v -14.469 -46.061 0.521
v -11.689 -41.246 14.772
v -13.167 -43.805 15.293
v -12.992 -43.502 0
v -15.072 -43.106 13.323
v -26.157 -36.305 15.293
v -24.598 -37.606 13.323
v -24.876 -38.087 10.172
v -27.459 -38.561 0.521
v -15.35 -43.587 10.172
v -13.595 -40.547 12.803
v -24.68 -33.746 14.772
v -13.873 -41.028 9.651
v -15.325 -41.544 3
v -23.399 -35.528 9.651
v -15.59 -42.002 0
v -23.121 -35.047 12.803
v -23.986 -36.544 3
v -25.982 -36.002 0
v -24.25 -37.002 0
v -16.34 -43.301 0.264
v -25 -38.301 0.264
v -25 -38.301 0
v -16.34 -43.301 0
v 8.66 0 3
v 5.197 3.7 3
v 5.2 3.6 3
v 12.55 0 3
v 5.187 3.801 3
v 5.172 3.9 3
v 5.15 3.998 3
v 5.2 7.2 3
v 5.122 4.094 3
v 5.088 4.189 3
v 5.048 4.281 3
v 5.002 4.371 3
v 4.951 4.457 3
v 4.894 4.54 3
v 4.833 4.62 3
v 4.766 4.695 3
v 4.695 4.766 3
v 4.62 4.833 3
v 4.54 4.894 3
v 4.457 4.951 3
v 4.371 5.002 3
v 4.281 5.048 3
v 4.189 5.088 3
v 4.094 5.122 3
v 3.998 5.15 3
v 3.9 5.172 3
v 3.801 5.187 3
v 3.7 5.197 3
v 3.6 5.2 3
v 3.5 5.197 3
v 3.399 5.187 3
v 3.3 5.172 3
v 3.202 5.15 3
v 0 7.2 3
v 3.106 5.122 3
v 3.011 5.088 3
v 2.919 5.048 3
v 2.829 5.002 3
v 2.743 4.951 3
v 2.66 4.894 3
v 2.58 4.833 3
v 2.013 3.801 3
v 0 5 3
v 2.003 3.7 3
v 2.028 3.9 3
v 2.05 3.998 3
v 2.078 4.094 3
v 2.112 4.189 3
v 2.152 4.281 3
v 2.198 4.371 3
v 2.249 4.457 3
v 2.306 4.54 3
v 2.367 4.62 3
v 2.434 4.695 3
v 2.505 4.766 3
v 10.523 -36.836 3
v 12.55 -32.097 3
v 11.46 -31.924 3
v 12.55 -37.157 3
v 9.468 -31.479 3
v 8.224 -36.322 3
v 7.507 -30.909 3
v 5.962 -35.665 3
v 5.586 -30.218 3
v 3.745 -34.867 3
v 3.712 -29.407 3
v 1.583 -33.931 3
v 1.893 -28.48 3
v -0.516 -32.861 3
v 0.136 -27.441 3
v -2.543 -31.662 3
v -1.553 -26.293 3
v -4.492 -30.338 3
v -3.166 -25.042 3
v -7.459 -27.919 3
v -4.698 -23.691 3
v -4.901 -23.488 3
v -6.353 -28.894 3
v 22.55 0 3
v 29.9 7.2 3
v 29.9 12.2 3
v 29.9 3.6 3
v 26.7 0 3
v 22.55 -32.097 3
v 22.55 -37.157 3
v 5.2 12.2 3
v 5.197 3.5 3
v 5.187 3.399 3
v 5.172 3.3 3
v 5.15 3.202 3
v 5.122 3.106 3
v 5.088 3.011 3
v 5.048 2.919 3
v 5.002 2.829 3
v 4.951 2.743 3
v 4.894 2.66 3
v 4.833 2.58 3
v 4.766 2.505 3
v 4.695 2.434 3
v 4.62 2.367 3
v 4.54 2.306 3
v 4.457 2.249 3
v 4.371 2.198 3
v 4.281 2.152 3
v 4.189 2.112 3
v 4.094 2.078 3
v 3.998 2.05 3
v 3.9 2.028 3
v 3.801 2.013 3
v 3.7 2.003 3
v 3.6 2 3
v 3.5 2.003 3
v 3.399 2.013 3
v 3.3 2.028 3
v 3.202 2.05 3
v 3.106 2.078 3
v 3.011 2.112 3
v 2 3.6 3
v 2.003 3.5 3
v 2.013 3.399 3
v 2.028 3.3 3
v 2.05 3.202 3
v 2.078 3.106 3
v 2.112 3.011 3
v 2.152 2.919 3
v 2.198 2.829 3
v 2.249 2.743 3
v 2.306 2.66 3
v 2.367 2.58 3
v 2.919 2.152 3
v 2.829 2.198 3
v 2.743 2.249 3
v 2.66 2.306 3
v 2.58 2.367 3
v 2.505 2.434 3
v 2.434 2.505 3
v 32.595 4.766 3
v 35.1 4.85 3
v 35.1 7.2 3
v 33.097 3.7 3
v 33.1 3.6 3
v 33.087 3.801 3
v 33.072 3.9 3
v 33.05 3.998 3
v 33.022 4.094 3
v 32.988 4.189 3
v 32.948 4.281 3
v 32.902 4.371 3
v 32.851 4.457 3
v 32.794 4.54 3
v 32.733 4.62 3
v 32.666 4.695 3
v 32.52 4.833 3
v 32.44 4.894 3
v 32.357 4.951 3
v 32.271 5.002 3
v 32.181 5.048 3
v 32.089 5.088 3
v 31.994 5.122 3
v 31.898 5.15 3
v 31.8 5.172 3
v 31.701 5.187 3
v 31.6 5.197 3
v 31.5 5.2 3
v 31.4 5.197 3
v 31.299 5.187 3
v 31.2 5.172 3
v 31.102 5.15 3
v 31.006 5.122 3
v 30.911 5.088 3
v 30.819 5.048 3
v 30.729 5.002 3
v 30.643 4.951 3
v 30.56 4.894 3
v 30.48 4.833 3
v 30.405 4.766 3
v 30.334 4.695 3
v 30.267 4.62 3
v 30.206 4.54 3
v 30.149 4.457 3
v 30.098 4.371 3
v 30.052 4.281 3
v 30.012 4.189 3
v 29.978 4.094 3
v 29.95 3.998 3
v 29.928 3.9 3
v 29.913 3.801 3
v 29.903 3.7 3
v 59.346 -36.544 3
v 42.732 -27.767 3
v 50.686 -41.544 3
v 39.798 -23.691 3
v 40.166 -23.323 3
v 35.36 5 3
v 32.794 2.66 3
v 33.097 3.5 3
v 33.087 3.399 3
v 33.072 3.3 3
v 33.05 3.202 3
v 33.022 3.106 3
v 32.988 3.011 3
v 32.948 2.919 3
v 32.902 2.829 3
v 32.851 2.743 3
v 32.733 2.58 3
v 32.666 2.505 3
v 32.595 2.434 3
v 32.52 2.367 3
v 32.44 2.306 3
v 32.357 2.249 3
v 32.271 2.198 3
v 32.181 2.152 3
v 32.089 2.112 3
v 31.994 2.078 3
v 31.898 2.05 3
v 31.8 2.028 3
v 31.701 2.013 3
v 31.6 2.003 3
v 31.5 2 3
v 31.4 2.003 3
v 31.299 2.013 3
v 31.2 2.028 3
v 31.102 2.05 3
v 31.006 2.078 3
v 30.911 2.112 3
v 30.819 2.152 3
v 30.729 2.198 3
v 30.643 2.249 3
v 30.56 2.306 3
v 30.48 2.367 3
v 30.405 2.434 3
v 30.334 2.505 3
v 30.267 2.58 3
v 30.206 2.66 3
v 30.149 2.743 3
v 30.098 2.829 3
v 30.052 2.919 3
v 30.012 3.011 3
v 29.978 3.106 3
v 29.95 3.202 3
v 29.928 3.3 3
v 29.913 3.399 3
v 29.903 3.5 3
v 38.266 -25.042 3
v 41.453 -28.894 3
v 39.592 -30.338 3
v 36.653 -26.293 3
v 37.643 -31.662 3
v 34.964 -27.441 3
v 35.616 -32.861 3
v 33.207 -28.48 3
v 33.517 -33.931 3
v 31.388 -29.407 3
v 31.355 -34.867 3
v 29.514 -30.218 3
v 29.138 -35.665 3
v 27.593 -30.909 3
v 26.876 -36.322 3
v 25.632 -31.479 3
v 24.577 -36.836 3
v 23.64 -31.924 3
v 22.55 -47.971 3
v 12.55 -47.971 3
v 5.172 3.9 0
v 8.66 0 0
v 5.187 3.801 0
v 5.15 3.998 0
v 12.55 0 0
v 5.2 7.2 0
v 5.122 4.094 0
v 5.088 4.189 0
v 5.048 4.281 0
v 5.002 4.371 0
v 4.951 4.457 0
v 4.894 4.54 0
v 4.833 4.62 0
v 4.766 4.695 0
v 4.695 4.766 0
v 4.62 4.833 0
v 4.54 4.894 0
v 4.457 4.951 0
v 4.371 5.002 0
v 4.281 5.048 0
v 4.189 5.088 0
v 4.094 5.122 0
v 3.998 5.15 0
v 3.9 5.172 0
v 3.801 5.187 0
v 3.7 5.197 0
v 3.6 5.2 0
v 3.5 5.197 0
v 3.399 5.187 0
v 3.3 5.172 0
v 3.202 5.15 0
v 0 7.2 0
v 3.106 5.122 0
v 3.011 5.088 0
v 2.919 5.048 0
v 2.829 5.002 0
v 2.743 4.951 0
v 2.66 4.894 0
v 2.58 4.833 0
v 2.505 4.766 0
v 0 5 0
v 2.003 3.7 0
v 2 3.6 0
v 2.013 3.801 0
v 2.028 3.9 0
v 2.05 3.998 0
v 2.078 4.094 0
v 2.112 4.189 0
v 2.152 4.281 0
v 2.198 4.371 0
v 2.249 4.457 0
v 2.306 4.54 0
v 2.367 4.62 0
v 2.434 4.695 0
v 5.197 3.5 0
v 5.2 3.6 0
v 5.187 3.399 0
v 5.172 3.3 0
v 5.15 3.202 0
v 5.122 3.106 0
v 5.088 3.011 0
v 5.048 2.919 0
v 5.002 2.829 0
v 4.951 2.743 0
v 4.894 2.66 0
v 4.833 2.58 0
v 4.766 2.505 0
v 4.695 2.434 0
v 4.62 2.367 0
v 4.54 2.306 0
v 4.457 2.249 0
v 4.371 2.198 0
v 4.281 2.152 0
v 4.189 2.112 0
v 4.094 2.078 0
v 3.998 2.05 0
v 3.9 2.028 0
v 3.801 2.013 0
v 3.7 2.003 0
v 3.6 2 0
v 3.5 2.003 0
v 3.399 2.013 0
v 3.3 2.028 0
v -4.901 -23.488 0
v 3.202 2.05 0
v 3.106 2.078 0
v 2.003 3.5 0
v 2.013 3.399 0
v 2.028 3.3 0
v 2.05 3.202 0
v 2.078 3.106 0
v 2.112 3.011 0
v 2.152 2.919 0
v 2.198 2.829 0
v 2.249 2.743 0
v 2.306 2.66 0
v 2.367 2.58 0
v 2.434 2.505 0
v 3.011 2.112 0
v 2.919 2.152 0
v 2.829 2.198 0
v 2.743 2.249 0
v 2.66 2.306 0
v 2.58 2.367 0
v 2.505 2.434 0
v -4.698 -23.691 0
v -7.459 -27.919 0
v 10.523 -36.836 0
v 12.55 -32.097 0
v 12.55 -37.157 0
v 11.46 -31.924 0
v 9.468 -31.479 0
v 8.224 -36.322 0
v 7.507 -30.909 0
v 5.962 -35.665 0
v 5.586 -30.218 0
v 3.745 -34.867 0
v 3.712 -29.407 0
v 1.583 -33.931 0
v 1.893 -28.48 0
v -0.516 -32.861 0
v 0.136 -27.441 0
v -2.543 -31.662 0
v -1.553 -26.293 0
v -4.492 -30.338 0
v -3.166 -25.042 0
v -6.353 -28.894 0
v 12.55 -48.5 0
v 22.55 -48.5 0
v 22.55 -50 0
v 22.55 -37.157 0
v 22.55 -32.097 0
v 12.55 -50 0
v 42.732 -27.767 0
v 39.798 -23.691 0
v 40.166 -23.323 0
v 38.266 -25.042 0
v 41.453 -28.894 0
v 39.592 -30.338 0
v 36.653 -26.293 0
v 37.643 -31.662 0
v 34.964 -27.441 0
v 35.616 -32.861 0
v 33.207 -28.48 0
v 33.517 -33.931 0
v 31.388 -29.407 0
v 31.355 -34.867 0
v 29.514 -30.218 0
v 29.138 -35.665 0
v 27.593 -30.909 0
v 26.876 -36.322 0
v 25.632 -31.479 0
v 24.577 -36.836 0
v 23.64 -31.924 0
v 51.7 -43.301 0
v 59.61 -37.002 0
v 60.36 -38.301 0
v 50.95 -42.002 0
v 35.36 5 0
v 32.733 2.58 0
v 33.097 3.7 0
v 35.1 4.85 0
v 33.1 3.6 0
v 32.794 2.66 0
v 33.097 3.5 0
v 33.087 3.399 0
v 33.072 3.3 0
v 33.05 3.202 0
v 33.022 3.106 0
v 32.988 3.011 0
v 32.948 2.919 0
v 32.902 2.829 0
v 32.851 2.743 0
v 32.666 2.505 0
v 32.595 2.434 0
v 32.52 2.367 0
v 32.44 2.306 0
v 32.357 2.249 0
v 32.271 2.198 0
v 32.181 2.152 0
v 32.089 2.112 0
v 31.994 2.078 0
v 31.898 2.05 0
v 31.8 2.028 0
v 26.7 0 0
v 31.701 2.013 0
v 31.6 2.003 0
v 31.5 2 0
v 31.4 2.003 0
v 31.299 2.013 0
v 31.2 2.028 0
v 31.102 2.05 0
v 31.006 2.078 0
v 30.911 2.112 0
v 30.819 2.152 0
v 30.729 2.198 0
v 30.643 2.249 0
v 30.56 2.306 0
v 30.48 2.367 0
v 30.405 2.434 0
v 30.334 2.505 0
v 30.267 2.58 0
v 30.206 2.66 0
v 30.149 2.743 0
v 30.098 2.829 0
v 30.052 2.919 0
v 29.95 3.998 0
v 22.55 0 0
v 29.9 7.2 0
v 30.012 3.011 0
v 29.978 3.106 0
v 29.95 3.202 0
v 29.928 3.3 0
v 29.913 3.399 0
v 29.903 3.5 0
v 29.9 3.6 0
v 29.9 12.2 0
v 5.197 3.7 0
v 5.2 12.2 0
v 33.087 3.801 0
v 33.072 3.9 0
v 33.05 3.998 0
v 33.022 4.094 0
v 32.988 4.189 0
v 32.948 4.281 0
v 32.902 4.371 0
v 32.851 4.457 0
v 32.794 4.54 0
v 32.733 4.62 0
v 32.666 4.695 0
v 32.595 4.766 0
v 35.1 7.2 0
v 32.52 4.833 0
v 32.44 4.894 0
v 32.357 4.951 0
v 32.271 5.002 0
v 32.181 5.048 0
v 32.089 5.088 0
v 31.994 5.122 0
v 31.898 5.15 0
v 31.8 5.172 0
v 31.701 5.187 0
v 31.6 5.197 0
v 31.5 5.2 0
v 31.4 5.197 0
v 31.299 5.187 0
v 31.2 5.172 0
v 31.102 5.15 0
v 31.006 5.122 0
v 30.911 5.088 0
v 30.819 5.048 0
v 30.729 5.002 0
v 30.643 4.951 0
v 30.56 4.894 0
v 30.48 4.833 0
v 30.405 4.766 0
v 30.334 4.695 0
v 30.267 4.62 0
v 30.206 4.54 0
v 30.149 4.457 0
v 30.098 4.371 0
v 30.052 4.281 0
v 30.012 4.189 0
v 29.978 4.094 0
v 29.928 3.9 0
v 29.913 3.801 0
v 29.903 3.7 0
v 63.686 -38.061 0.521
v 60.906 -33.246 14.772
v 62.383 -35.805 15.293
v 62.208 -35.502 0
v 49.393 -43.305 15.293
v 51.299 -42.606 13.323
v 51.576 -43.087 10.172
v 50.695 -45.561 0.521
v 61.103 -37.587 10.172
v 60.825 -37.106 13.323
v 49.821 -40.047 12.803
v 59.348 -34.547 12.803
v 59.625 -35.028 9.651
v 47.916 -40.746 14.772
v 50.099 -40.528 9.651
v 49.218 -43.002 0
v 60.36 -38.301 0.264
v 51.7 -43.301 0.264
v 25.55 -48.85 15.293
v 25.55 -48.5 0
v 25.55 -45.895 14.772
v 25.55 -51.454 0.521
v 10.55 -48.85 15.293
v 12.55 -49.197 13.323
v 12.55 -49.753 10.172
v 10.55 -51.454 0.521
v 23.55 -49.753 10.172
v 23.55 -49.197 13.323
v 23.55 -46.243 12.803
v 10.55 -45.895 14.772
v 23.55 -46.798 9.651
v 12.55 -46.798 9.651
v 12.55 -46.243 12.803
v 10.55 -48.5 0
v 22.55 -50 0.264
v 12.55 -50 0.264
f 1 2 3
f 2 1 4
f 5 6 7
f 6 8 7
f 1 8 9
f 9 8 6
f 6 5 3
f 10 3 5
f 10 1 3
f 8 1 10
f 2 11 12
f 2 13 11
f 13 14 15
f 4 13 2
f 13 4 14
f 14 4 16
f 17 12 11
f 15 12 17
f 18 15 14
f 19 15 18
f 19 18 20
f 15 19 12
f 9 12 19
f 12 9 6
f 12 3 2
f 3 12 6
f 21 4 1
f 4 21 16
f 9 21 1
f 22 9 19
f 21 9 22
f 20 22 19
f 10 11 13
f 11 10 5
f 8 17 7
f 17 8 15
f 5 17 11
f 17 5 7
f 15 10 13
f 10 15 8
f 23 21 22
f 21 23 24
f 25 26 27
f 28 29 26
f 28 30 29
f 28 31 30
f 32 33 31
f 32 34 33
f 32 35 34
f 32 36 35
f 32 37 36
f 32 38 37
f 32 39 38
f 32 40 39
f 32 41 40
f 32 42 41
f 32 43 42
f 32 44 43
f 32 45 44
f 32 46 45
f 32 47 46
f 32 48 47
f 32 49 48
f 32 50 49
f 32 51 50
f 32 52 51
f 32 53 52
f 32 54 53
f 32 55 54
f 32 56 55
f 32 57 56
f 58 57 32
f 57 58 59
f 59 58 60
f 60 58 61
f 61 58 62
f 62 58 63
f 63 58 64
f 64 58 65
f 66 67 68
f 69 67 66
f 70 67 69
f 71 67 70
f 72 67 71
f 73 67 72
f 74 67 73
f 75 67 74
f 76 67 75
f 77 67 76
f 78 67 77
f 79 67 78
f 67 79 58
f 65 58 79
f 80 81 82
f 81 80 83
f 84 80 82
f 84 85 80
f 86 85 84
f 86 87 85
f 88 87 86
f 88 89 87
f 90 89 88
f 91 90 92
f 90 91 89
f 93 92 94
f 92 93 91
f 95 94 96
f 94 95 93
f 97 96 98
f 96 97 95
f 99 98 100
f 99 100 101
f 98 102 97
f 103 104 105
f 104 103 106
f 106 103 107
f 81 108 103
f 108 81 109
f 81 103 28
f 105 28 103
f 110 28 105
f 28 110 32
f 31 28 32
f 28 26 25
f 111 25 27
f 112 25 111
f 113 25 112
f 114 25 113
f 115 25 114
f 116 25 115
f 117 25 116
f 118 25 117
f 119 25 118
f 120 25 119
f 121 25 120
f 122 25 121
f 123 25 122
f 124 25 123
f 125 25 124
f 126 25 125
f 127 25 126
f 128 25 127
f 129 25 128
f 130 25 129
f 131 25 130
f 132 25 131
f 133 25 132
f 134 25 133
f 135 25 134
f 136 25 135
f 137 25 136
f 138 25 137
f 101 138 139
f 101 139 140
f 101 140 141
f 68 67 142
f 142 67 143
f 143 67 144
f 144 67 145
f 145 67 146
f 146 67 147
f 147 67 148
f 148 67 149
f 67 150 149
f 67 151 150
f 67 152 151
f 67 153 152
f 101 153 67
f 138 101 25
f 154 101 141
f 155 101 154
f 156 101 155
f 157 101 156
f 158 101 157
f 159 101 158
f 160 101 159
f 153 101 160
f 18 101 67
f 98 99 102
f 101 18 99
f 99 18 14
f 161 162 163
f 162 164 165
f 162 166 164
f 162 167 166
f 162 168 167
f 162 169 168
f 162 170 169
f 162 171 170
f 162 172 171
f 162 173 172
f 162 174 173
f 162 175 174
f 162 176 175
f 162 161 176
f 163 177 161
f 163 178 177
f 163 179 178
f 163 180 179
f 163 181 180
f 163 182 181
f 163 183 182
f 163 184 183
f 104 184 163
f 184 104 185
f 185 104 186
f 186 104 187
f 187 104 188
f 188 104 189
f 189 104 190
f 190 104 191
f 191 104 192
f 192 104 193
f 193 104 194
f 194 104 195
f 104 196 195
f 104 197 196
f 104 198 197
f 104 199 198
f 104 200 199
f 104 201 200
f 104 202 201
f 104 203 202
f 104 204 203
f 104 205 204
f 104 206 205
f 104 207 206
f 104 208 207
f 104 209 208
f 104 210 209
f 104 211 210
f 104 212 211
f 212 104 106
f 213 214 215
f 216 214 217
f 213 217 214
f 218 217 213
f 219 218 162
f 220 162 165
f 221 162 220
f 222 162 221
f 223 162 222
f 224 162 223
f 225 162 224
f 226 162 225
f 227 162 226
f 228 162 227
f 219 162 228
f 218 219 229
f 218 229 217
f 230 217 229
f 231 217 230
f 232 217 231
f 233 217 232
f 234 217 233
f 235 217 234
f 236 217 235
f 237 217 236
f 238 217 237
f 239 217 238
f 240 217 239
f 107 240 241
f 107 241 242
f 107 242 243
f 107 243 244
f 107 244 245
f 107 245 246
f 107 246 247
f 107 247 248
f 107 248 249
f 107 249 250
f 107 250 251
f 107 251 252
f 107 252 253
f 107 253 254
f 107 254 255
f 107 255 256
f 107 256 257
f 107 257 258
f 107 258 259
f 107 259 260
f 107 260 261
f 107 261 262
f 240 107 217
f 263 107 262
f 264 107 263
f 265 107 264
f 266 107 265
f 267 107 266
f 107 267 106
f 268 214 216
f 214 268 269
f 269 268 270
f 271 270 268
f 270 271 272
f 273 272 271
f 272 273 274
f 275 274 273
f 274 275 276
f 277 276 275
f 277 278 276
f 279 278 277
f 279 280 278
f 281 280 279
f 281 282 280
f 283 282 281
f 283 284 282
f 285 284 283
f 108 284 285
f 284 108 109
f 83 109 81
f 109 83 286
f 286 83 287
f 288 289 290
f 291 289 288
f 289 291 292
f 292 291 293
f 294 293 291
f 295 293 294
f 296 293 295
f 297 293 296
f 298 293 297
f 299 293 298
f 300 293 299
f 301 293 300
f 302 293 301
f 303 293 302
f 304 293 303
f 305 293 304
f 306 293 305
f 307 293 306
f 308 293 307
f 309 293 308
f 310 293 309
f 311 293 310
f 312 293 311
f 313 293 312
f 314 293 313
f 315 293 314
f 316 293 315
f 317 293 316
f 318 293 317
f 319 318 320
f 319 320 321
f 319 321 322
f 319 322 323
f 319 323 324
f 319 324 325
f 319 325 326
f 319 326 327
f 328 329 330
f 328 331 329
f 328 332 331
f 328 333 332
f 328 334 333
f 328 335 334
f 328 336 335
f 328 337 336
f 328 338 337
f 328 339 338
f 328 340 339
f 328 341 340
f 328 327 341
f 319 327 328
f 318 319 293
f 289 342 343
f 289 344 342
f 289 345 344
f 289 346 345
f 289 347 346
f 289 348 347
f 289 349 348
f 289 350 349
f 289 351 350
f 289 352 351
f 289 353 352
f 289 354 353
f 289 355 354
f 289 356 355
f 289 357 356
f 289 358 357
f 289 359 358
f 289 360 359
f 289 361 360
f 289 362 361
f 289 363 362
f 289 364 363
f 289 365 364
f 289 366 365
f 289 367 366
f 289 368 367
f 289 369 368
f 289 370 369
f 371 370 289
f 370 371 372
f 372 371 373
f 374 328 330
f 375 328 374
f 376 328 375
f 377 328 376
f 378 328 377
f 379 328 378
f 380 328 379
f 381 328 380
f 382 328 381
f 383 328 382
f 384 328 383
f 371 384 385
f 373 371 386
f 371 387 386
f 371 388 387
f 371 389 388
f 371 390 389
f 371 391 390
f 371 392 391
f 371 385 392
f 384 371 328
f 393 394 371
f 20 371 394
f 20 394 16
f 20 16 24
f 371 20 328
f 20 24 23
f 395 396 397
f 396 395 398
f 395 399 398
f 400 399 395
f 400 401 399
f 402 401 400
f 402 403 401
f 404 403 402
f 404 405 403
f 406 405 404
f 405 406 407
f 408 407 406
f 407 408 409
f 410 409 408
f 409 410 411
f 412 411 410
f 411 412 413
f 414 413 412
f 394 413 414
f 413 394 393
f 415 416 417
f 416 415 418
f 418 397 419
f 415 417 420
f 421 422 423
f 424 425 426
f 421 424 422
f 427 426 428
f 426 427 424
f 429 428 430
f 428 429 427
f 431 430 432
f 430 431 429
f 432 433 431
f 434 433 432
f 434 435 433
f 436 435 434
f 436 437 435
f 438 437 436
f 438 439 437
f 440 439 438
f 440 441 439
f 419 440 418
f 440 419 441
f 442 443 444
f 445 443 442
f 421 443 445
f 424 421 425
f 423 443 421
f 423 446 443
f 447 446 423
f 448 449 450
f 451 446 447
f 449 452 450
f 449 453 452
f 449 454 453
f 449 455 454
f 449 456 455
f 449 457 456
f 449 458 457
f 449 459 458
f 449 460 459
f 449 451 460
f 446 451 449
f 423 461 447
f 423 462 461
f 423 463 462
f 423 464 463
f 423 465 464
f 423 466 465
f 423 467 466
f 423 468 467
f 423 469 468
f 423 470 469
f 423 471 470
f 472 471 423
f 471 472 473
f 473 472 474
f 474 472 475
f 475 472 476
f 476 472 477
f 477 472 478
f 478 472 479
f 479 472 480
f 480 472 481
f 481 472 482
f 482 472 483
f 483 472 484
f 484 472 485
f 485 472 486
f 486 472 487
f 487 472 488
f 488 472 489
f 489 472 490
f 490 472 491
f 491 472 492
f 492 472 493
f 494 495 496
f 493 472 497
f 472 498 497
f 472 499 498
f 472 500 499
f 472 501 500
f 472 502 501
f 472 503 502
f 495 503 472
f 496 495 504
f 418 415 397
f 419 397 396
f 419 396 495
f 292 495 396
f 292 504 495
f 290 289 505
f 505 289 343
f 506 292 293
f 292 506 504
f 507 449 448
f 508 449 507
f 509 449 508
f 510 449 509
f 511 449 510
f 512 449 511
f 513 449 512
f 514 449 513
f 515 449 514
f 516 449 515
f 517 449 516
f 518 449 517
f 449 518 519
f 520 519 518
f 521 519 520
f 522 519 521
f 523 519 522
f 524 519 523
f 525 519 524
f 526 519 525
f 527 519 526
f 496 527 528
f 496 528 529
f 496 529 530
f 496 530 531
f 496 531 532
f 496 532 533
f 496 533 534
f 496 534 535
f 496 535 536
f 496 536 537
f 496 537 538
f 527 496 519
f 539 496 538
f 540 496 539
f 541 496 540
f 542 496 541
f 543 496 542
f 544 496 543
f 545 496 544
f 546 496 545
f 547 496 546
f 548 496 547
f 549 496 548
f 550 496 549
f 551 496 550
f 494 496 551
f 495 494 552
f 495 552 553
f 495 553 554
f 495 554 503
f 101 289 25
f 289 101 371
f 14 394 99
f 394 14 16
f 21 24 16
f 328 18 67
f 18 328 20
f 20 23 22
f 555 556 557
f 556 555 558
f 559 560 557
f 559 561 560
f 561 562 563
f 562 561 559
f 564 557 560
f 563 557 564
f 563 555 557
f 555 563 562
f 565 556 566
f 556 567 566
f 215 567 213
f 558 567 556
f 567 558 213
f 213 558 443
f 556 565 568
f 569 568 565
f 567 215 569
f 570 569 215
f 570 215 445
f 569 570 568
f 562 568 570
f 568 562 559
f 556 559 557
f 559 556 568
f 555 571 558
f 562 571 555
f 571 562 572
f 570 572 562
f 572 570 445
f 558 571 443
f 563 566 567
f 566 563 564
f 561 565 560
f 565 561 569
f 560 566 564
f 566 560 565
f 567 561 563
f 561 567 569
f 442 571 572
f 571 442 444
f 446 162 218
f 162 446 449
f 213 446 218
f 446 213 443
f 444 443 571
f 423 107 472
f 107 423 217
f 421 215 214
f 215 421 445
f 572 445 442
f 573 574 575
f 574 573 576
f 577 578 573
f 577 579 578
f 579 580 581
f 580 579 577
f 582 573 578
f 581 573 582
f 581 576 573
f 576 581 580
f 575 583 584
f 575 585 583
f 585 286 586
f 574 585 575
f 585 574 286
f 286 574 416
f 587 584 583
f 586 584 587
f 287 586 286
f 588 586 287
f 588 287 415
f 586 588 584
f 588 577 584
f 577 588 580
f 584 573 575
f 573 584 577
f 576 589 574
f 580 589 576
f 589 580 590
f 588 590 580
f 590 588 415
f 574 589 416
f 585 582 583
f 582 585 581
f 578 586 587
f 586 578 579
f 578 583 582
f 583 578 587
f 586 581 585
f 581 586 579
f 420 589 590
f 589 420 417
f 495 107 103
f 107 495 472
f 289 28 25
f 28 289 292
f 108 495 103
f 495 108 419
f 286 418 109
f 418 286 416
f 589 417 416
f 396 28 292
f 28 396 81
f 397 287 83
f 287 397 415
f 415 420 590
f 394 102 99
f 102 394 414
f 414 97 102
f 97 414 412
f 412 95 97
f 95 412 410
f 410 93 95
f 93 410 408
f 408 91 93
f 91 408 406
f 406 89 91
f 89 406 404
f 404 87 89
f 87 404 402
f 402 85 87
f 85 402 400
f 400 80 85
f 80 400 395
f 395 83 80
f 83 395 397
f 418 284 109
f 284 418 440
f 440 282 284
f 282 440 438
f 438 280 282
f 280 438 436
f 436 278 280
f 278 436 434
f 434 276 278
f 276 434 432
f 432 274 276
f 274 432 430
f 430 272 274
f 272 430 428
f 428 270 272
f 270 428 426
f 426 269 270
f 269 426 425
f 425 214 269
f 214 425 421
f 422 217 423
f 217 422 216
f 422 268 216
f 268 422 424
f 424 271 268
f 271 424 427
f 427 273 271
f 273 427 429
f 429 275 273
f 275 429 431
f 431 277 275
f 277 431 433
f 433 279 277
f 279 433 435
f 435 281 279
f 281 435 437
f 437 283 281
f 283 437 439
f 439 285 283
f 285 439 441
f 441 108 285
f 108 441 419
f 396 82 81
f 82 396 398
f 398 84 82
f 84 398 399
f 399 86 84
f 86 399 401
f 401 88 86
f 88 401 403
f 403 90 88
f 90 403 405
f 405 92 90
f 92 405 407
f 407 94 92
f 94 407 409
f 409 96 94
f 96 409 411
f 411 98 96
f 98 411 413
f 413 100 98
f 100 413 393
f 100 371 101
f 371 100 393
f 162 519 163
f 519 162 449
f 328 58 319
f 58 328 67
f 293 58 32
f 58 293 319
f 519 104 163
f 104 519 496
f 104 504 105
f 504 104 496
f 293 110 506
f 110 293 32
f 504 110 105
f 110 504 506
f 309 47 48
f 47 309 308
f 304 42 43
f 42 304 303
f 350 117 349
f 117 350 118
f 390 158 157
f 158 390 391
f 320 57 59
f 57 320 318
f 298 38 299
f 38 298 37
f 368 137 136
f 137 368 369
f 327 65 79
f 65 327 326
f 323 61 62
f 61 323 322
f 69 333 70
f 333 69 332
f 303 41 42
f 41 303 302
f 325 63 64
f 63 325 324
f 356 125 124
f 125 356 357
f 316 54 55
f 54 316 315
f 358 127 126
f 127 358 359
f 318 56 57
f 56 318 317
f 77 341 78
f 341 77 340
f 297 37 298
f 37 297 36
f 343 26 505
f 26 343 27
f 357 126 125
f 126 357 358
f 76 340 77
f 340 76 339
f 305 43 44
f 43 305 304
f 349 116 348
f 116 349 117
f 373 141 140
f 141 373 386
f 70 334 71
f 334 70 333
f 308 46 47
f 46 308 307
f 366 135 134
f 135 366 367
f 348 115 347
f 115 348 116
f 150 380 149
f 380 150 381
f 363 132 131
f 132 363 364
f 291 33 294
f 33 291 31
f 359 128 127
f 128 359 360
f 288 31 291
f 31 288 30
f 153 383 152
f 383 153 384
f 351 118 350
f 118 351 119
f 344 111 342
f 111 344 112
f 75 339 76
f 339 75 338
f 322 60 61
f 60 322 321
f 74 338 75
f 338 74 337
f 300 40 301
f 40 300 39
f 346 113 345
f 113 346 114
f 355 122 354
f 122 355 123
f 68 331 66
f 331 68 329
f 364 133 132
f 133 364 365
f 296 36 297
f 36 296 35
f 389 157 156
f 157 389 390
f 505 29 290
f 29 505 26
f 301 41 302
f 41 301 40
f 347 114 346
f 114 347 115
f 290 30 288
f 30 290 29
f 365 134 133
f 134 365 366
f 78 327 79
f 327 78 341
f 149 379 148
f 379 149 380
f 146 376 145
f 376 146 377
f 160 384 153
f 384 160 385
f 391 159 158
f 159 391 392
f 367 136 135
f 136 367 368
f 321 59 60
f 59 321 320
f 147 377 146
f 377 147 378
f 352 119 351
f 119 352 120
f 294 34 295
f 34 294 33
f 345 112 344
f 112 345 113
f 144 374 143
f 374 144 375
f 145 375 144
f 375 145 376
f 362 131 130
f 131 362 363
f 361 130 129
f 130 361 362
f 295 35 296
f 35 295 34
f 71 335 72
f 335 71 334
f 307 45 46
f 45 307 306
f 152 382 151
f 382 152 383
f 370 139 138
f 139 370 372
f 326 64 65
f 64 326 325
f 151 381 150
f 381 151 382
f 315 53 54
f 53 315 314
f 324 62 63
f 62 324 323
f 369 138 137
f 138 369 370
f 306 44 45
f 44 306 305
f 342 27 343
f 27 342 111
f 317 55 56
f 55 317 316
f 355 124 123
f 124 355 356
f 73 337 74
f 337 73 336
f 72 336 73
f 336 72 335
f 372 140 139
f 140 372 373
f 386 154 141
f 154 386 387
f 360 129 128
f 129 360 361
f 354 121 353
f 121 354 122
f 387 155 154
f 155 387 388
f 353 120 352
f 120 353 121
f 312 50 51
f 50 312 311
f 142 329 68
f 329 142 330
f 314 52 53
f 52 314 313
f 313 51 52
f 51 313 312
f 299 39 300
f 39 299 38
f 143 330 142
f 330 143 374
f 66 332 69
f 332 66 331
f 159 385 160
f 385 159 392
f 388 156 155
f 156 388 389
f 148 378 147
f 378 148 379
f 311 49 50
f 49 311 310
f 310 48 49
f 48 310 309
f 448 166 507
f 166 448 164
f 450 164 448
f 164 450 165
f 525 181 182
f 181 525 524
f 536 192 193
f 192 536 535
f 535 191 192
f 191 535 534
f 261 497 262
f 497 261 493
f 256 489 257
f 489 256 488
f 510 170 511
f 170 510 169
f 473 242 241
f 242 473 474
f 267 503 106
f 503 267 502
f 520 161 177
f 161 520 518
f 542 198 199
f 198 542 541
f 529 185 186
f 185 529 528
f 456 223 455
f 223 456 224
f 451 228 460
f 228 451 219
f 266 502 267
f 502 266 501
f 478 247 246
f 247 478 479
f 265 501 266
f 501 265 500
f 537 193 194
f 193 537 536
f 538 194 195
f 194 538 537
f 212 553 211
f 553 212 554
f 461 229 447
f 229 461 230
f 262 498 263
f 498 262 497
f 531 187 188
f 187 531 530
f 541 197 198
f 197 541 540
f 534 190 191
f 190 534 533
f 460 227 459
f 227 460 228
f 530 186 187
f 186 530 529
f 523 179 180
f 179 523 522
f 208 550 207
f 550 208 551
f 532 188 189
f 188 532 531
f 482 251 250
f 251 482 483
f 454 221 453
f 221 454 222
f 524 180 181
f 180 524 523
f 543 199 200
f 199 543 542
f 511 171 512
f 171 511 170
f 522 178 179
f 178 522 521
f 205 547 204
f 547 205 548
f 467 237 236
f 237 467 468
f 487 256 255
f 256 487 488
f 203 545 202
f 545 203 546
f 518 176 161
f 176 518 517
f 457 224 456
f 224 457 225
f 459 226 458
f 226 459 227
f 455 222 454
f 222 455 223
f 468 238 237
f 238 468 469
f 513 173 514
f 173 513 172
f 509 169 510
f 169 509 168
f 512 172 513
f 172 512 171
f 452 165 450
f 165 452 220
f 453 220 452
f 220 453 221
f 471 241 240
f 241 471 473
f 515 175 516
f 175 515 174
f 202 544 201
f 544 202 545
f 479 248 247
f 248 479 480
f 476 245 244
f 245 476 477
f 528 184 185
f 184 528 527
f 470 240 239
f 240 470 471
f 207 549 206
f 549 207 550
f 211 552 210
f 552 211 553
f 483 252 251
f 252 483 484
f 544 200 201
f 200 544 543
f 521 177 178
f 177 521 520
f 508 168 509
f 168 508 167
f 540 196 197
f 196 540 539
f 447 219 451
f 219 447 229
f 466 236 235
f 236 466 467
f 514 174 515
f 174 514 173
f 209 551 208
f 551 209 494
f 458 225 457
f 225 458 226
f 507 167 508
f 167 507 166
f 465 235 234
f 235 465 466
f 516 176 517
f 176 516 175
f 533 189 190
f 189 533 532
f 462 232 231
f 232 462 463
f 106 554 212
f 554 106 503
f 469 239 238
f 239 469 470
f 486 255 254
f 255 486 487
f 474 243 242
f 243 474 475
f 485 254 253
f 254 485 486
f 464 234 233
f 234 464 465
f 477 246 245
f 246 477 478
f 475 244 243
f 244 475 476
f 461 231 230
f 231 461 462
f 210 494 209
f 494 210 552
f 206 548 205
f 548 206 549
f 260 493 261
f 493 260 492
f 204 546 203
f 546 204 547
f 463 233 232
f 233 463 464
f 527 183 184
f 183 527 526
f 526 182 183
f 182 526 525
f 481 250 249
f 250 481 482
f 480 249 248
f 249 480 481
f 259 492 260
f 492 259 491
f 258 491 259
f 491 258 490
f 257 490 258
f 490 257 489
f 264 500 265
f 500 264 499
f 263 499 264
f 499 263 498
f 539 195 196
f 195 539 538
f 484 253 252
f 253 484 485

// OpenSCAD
ard_hole_dia = 3.2;
ard_hole_spacing = 27.9;
thickness = 3;
extension = 2;
board_tab_len = 5;
arm_width = 10;
arm_length = 50;
sensor_tilt = 10; // degrees up
sensor_height = 12;
connector_width = 11;
connector_height = 3.2; // really 2.6, but compensates for shrinkage
arc_width = 5;

module 2D_arc(w, r, deg=90,fn = 100 ) {
	render() {
		difference() {
			// outer circle
			circle(r=r+w/2,center=true,$fn=fn);
			// outer circle
			circle(r=r-w/2,center=true,$fn=fn);

		//remove the areas not covered by the arc
		translate([sin(90-deg/2)*((r+w/2)*2),
						-sin(deg/2)*((r+w/2)*2)])
			rotate([0,0,90-deg/2])
				translate([((r+w/2))-sin(90-(deg)/4)*((r+w/2)),
							((r+w/2))*2-sin(90-(deg)/4)*((r+w/2))])
					square([sin(90-deg/4)*((r+w/2)*2),
								sin(90-deg/4)*((r+w/2)*2)],center=true);
		translate([-sin(90-(deg)/2)*((r+w/2)*2),
						-sin(deg/2)*((r+w/2)*2)])
			rotate([0,0,-(90-deg/2)])
			  translate([-((r+w/2))+sin(90-(deg)/4)*((r+w/2)),
							((r+w/2))*2-sin(90-(deg)/4)*((r+w/2))])
					square([sin(90-deg/4)*((r+w/2)*2),
								sin(90-deg/4)*((r+w/2)*2)],center=true);
		}
	}
}

module 3D_arc(w, r, deg, h,fn) {
	linear_extrude(h)
			2D_arc(w, r, deg,fn);

}


module sensor_arm() {   
    cube([arm_length, arm_width, thickness]);   
    translate([arm_length-thickness/2, 0, 0])
    rotate([90-sensor_tilt,0,90]) {
        difference() {
            translate([-extension,0,0])
            cube([connector_width + extension*2, sensor_height+thickness, thickness]);
            translate([0,sensor_height+thickness-connector_height-extension, -0.1])
                cube([connector_width, connector_height, thickness+0.2]);
        }
    }
}

difference() {
    union(){
        translate([(ard_hole_spacing+ard_hole_dia)/2 + extension,0,0])
        rotate([0,0,180])
            3D_arc(arc_width,35, 100, thickness, 100);
        cube([ard_hole_spacing + ard_hole_dia + (extension *2), 
            ard_hole_dia + (extension * 2), 
            thickness]);
        translate([0,5,0])
            rotate([0,0,270-30])
                sensor_arm();
        translate([ard_hole_spacing - ard_hole_dia+extension,0,0])
            rotate([0,0,270+30])
                sensor_arm();
        translate([(ard_hole_spacing+ard_hole_dia)/2 + extension-arm_width/2,0,0])
            rotate([0,0,270])
                sensor_arm();
        translate([ard_hole_dia + extension,
                    ard_hole_dia + (extension * 2),0])
            cube([ard_hole_spacing - ard_hole_dia,
                  board_tab_len, thickness]);
    }
    translate([ard_hole_dia/2+extension,
                ard_hole_dia/2+extension,
                -.1])
        cylinder(r=ard_hole_dia/2, h=thickness+0.2, $fn=100);
    translate([ard_hole_dia/2+extension+ard_hole_spacing,
                ard_hole_dia/2+extension,
                -.1])
        cylinder(r=ard_hole_dia/2, h=thickness+0.2, $fn=100);
}
